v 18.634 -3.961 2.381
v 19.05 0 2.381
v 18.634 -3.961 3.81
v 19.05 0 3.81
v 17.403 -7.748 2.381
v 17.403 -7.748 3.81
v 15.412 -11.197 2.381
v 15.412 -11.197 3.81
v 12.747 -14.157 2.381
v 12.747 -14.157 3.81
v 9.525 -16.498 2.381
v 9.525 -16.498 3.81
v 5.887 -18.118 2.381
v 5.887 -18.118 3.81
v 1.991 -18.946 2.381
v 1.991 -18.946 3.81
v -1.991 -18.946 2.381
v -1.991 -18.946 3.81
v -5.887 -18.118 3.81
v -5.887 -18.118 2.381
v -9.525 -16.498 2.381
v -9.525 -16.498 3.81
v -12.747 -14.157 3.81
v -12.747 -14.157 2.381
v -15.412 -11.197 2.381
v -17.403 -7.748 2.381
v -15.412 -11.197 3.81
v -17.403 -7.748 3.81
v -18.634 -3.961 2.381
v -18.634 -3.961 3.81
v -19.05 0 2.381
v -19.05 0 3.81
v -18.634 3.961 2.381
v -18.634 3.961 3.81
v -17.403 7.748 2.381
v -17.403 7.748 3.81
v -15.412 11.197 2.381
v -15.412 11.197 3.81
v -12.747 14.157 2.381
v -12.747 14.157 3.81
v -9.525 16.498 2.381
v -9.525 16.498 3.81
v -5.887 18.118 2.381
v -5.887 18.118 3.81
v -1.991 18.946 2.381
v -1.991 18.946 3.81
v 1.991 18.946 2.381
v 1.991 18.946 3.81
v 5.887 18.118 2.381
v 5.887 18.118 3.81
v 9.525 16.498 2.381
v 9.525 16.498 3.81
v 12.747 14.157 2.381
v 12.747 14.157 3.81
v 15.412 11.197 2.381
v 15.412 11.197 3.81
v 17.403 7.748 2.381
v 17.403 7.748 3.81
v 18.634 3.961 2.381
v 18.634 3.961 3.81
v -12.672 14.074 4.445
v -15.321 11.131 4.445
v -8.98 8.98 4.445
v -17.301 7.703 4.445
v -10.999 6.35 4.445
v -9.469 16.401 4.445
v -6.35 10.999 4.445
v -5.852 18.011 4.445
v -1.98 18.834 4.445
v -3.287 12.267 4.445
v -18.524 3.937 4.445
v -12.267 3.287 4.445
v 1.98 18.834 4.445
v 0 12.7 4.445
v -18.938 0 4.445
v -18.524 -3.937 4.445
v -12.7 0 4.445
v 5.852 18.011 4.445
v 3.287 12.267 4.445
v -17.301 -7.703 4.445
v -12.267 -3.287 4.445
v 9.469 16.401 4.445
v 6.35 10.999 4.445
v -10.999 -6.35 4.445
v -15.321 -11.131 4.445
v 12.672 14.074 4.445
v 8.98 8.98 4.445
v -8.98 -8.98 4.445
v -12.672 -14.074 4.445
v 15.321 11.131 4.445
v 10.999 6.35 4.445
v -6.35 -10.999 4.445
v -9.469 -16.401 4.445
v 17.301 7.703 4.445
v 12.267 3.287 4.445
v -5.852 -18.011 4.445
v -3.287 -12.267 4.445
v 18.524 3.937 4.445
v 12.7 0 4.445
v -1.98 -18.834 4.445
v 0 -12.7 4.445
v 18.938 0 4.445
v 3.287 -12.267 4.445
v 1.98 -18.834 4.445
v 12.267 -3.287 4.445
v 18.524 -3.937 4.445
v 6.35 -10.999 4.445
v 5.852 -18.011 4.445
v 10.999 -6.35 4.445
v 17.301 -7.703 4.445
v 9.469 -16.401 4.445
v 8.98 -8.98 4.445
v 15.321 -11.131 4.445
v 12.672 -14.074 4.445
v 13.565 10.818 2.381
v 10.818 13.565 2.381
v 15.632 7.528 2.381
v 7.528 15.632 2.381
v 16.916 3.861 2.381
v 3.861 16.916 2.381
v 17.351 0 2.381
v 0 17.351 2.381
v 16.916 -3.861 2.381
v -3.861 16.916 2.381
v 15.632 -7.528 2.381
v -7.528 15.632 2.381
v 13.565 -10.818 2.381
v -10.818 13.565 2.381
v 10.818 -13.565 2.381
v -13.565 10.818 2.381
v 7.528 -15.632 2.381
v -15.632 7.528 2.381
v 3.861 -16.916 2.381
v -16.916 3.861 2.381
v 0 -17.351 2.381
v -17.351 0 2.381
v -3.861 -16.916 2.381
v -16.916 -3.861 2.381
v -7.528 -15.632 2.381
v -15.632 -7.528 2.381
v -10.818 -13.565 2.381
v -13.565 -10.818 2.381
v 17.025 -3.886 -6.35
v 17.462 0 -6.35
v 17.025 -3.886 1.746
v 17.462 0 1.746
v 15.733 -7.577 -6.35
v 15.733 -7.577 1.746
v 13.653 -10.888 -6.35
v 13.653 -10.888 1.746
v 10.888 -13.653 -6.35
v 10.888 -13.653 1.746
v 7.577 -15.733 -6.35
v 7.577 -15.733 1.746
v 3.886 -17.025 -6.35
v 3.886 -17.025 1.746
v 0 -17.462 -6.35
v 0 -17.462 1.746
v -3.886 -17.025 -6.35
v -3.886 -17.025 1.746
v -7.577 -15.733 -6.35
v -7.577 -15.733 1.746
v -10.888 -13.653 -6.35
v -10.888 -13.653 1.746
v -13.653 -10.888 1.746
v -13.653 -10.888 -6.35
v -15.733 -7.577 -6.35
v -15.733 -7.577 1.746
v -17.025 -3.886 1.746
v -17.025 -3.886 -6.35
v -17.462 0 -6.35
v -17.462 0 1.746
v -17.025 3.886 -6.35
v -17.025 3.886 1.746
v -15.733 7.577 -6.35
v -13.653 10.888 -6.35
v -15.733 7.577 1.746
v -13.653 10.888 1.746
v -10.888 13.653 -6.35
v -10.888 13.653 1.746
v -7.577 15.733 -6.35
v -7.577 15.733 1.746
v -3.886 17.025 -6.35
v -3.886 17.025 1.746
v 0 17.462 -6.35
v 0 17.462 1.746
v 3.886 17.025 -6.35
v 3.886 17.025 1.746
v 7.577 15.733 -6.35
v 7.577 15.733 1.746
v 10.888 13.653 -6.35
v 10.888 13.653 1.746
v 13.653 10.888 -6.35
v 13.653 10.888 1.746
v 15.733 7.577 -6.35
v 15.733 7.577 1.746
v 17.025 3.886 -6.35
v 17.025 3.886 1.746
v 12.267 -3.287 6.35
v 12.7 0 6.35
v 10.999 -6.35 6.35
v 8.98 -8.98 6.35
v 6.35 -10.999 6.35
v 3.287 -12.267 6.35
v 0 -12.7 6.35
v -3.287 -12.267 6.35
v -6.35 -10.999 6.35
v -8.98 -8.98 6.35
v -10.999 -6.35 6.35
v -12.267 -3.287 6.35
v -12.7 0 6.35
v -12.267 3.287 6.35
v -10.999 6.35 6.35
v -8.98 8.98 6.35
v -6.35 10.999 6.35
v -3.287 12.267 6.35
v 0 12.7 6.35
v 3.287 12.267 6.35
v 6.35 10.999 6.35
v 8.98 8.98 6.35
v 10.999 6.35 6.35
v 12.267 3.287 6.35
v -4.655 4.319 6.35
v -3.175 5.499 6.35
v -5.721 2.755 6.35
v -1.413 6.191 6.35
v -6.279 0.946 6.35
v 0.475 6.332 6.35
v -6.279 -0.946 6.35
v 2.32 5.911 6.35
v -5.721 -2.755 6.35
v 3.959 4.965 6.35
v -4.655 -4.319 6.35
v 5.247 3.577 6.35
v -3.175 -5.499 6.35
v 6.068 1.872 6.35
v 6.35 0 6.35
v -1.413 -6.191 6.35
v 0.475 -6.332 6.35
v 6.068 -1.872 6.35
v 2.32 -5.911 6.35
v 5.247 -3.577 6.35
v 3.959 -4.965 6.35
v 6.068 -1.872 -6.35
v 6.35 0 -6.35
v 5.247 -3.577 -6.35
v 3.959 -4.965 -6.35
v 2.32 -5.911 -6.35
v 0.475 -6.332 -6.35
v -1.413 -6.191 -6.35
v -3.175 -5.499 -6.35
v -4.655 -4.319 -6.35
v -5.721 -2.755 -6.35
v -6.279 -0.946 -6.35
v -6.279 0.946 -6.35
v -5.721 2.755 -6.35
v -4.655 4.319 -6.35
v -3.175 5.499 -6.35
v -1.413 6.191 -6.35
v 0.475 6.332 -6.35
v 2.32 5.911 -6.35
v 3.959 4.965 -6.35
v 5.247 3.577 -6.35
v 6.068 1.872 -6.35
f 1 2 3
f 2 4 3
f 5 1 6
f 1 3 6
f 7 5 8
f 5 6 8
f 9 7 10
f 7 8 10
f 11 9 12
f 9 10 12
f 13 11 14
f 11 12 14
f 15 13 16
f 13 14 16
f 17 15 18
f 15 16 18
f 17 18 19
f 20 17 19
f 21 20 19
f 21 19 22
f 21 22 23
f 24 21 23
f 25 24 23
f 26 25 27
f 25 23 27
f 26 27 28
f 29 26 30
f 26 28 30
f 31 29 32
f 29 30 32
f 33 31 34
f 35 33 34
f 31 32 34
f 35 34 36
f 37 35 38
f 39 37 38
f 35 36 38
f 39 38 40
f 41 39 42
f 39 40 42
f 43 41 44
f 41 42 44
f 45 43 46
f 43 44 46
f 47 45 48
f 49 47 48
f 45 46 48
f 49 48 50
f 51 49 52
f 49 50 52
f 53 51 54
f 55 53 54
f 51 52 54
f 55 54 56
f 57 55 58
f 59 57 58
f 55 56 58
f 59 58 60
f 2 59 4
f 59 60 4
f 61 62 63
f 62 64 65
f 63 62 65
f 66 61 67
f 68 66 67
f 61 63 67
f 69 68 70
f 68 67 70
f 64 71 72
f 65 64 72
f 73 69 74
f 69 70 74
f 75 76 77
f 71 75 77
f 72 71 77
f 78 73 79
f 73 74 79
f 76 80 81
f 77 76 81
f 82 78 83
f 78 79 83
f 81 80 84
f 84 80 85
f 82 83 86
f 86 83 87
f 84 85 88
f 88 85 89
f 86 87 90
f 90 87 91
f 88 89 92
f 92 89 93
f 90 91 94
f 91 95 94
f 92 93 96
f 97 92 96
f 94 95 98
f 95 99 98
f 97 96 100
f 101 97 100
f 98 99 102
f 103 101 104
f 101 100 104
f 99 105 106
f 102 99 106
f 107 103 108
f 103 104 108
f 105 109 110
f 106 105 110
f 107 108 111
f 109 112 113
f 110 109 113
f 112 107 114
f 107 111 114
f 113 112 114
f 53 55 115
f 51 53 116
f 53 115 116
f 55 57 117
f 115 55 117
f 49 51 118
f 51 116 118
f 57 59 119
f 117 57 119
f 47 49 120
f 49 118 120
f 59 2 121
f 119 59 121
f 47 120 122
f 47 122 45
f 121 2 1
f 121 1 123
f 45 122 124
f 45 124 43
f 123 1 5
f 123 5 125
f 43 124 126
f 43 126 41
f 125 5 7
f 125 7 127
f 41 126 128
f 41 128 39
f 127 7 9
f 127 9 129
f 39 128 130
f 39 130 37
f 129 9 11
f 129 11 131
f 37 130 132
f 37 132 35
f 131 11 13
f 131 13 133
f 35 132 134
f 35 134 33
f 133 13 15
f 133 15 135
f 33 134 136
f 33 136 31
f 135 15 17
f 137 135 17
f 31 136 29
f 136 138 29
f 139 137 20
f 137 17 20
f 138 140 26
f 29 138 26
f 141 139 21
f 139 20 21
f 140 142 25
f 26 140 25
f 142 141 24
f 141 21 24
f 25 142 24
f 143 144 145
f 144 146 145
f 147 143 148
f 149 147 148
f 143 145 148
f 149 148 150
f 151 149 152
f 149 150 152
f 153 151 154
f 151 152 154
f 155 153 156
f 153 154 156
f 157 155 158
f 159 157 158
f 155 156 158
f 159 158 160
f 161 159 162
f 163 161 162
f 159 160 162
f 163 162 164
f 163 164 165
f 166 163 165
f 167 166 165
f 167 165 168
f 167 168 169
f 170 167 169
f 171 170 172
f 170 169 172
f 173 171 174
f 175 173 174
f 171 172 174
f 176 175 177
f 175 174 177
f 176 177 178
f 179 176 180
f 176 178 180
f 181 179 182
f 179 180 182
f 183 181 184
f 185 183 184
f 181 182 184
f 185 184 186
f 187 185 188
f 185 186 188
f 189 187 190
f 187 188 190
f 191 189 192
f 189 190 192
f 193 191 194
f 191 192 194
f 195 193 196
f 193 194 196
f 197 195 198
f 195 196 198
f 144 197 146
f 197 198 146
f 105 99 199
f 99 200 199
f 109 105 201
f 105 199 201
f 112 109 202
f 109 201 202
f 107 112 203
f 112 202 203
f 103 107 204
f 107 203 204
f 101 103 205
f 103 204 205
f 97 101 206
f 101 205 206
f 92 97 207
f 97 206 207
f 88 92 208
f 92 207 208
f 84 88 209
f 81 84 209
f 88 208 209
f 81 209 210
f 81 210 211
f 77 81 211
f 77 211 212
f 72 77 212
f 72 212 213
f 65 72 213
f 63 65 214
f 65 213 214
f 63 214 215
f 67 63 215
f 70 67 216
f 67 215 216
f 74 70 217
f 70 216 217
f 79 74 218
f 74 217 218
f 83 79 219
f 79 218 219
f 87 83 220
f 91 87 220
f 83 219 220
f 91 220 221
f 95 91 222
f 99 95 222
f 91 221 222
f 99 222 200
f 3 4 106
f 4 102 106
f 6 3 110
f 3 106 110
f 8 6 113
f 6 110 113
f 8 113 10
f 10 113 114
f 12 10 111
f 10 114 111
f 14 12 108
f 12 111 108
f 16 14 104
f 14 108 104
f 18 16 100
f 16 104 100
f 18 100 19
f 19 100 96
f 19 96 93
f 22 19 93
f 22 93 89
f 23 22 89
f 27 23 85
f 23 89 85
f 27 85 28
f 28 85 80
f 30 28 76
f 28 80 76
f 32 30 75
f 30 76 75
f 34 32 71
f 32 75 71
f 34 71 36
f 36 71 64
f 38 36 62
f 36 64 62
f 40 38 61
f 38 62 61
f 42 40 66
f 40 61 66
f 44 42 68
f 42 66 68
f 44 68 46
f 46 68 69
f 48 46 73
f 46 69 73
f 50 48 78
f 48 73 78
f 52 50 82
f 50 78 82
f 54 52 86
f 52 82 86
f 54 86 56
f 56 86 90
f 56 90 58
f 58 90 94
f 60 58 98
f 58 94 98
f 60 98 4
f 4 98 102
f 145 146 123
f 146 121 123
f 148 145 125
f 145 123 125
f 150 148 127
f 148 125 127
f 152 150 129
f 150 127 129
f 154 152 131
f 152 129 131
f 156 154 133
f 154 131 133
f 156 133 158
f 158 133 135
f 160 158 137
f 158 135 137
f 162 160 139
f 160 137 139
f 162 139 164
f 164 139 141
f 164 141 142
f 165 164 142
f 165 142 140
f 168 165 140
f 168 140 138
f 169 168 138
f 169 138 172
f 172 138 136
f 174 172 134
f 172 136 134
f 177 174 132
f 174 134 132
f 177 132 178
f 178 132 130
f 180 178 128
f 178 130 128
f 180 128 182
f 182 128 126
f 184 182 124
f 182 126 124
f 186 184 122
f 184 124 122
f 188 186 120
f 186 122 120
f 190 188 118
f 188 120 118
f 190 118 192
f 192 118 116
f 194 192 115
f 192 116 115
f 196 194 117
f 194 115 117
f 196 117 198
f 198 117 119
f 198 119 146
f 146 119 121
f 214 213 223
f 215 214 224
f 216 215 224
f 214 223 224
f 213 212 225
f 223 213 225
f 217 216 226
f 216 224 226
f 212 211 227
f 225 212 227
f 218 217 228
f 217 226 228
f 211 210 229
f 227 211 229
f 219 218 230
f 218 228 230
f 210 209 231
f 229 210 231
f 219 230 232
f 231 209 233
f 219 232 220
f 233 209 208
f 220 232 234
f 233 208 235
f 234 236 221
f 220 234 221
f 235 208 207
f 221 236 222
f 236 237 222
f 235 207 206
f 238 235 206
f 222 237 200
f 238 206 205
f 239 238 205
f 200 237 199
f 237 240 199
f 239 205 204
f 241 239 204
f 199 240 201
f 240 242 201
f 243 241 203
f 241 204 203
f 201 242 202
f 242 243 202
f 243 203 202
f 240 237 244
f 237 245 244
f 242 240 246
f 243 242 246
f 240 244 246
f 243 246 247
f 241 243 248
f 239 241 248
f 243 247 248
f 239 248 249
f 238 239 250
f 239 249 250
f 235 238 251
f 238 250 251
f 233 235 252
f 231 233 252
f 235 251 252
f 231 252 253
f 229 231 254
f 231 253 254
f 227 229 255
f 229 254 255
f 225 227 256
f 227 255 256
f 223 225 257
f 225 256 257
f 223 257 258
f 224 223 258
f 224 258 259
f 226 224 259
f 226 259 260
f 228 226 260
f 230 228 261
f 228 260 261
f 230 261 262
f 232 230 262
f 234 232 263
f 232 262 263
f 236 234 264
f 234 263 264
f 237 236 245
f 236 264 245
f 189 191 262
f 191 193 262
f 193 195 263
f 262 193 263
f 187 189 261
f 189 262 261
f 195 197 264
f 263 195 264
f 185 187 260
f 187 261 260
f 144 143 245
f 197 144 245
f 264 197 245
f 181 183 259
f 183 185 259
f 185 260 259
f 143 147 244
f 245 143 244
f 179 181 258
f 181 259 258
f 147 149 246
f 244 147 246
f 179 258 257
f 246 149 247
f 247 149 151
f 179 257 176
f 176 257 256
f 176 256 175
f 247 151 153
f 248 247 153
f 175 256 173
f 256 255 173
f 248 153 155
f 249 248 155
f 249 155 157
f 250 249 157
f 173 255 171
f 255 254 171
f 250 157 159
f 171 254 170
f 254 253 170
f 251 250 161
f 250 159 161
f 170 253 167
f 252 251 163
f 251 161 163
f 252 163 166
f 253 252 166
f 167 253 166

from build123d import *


with BuildPart() as part:
    # Sketch1 → Revolve1 (revolve)
    with BuildSketch(Plane(origin=(0, 0, 0), x_dir=(-1, 0, 0), z_dir=(0, 1, 0))):
        Polygon((-17.4625, -6.35), (-17.4625, 1.74625), (-17.350532367, 2.38125), (-19.05, 2.38125), (-19.05, 3.81), (-18.938032367, 4.445), (-12.7, 4.445), (-12.7, 6.35), (-6.35, 6.35), (-6.35, -6.35), align=None)
    revolve(axis=Axis((0, 0, 114.851664886), (0, 0, -1)))


solid = part.part
